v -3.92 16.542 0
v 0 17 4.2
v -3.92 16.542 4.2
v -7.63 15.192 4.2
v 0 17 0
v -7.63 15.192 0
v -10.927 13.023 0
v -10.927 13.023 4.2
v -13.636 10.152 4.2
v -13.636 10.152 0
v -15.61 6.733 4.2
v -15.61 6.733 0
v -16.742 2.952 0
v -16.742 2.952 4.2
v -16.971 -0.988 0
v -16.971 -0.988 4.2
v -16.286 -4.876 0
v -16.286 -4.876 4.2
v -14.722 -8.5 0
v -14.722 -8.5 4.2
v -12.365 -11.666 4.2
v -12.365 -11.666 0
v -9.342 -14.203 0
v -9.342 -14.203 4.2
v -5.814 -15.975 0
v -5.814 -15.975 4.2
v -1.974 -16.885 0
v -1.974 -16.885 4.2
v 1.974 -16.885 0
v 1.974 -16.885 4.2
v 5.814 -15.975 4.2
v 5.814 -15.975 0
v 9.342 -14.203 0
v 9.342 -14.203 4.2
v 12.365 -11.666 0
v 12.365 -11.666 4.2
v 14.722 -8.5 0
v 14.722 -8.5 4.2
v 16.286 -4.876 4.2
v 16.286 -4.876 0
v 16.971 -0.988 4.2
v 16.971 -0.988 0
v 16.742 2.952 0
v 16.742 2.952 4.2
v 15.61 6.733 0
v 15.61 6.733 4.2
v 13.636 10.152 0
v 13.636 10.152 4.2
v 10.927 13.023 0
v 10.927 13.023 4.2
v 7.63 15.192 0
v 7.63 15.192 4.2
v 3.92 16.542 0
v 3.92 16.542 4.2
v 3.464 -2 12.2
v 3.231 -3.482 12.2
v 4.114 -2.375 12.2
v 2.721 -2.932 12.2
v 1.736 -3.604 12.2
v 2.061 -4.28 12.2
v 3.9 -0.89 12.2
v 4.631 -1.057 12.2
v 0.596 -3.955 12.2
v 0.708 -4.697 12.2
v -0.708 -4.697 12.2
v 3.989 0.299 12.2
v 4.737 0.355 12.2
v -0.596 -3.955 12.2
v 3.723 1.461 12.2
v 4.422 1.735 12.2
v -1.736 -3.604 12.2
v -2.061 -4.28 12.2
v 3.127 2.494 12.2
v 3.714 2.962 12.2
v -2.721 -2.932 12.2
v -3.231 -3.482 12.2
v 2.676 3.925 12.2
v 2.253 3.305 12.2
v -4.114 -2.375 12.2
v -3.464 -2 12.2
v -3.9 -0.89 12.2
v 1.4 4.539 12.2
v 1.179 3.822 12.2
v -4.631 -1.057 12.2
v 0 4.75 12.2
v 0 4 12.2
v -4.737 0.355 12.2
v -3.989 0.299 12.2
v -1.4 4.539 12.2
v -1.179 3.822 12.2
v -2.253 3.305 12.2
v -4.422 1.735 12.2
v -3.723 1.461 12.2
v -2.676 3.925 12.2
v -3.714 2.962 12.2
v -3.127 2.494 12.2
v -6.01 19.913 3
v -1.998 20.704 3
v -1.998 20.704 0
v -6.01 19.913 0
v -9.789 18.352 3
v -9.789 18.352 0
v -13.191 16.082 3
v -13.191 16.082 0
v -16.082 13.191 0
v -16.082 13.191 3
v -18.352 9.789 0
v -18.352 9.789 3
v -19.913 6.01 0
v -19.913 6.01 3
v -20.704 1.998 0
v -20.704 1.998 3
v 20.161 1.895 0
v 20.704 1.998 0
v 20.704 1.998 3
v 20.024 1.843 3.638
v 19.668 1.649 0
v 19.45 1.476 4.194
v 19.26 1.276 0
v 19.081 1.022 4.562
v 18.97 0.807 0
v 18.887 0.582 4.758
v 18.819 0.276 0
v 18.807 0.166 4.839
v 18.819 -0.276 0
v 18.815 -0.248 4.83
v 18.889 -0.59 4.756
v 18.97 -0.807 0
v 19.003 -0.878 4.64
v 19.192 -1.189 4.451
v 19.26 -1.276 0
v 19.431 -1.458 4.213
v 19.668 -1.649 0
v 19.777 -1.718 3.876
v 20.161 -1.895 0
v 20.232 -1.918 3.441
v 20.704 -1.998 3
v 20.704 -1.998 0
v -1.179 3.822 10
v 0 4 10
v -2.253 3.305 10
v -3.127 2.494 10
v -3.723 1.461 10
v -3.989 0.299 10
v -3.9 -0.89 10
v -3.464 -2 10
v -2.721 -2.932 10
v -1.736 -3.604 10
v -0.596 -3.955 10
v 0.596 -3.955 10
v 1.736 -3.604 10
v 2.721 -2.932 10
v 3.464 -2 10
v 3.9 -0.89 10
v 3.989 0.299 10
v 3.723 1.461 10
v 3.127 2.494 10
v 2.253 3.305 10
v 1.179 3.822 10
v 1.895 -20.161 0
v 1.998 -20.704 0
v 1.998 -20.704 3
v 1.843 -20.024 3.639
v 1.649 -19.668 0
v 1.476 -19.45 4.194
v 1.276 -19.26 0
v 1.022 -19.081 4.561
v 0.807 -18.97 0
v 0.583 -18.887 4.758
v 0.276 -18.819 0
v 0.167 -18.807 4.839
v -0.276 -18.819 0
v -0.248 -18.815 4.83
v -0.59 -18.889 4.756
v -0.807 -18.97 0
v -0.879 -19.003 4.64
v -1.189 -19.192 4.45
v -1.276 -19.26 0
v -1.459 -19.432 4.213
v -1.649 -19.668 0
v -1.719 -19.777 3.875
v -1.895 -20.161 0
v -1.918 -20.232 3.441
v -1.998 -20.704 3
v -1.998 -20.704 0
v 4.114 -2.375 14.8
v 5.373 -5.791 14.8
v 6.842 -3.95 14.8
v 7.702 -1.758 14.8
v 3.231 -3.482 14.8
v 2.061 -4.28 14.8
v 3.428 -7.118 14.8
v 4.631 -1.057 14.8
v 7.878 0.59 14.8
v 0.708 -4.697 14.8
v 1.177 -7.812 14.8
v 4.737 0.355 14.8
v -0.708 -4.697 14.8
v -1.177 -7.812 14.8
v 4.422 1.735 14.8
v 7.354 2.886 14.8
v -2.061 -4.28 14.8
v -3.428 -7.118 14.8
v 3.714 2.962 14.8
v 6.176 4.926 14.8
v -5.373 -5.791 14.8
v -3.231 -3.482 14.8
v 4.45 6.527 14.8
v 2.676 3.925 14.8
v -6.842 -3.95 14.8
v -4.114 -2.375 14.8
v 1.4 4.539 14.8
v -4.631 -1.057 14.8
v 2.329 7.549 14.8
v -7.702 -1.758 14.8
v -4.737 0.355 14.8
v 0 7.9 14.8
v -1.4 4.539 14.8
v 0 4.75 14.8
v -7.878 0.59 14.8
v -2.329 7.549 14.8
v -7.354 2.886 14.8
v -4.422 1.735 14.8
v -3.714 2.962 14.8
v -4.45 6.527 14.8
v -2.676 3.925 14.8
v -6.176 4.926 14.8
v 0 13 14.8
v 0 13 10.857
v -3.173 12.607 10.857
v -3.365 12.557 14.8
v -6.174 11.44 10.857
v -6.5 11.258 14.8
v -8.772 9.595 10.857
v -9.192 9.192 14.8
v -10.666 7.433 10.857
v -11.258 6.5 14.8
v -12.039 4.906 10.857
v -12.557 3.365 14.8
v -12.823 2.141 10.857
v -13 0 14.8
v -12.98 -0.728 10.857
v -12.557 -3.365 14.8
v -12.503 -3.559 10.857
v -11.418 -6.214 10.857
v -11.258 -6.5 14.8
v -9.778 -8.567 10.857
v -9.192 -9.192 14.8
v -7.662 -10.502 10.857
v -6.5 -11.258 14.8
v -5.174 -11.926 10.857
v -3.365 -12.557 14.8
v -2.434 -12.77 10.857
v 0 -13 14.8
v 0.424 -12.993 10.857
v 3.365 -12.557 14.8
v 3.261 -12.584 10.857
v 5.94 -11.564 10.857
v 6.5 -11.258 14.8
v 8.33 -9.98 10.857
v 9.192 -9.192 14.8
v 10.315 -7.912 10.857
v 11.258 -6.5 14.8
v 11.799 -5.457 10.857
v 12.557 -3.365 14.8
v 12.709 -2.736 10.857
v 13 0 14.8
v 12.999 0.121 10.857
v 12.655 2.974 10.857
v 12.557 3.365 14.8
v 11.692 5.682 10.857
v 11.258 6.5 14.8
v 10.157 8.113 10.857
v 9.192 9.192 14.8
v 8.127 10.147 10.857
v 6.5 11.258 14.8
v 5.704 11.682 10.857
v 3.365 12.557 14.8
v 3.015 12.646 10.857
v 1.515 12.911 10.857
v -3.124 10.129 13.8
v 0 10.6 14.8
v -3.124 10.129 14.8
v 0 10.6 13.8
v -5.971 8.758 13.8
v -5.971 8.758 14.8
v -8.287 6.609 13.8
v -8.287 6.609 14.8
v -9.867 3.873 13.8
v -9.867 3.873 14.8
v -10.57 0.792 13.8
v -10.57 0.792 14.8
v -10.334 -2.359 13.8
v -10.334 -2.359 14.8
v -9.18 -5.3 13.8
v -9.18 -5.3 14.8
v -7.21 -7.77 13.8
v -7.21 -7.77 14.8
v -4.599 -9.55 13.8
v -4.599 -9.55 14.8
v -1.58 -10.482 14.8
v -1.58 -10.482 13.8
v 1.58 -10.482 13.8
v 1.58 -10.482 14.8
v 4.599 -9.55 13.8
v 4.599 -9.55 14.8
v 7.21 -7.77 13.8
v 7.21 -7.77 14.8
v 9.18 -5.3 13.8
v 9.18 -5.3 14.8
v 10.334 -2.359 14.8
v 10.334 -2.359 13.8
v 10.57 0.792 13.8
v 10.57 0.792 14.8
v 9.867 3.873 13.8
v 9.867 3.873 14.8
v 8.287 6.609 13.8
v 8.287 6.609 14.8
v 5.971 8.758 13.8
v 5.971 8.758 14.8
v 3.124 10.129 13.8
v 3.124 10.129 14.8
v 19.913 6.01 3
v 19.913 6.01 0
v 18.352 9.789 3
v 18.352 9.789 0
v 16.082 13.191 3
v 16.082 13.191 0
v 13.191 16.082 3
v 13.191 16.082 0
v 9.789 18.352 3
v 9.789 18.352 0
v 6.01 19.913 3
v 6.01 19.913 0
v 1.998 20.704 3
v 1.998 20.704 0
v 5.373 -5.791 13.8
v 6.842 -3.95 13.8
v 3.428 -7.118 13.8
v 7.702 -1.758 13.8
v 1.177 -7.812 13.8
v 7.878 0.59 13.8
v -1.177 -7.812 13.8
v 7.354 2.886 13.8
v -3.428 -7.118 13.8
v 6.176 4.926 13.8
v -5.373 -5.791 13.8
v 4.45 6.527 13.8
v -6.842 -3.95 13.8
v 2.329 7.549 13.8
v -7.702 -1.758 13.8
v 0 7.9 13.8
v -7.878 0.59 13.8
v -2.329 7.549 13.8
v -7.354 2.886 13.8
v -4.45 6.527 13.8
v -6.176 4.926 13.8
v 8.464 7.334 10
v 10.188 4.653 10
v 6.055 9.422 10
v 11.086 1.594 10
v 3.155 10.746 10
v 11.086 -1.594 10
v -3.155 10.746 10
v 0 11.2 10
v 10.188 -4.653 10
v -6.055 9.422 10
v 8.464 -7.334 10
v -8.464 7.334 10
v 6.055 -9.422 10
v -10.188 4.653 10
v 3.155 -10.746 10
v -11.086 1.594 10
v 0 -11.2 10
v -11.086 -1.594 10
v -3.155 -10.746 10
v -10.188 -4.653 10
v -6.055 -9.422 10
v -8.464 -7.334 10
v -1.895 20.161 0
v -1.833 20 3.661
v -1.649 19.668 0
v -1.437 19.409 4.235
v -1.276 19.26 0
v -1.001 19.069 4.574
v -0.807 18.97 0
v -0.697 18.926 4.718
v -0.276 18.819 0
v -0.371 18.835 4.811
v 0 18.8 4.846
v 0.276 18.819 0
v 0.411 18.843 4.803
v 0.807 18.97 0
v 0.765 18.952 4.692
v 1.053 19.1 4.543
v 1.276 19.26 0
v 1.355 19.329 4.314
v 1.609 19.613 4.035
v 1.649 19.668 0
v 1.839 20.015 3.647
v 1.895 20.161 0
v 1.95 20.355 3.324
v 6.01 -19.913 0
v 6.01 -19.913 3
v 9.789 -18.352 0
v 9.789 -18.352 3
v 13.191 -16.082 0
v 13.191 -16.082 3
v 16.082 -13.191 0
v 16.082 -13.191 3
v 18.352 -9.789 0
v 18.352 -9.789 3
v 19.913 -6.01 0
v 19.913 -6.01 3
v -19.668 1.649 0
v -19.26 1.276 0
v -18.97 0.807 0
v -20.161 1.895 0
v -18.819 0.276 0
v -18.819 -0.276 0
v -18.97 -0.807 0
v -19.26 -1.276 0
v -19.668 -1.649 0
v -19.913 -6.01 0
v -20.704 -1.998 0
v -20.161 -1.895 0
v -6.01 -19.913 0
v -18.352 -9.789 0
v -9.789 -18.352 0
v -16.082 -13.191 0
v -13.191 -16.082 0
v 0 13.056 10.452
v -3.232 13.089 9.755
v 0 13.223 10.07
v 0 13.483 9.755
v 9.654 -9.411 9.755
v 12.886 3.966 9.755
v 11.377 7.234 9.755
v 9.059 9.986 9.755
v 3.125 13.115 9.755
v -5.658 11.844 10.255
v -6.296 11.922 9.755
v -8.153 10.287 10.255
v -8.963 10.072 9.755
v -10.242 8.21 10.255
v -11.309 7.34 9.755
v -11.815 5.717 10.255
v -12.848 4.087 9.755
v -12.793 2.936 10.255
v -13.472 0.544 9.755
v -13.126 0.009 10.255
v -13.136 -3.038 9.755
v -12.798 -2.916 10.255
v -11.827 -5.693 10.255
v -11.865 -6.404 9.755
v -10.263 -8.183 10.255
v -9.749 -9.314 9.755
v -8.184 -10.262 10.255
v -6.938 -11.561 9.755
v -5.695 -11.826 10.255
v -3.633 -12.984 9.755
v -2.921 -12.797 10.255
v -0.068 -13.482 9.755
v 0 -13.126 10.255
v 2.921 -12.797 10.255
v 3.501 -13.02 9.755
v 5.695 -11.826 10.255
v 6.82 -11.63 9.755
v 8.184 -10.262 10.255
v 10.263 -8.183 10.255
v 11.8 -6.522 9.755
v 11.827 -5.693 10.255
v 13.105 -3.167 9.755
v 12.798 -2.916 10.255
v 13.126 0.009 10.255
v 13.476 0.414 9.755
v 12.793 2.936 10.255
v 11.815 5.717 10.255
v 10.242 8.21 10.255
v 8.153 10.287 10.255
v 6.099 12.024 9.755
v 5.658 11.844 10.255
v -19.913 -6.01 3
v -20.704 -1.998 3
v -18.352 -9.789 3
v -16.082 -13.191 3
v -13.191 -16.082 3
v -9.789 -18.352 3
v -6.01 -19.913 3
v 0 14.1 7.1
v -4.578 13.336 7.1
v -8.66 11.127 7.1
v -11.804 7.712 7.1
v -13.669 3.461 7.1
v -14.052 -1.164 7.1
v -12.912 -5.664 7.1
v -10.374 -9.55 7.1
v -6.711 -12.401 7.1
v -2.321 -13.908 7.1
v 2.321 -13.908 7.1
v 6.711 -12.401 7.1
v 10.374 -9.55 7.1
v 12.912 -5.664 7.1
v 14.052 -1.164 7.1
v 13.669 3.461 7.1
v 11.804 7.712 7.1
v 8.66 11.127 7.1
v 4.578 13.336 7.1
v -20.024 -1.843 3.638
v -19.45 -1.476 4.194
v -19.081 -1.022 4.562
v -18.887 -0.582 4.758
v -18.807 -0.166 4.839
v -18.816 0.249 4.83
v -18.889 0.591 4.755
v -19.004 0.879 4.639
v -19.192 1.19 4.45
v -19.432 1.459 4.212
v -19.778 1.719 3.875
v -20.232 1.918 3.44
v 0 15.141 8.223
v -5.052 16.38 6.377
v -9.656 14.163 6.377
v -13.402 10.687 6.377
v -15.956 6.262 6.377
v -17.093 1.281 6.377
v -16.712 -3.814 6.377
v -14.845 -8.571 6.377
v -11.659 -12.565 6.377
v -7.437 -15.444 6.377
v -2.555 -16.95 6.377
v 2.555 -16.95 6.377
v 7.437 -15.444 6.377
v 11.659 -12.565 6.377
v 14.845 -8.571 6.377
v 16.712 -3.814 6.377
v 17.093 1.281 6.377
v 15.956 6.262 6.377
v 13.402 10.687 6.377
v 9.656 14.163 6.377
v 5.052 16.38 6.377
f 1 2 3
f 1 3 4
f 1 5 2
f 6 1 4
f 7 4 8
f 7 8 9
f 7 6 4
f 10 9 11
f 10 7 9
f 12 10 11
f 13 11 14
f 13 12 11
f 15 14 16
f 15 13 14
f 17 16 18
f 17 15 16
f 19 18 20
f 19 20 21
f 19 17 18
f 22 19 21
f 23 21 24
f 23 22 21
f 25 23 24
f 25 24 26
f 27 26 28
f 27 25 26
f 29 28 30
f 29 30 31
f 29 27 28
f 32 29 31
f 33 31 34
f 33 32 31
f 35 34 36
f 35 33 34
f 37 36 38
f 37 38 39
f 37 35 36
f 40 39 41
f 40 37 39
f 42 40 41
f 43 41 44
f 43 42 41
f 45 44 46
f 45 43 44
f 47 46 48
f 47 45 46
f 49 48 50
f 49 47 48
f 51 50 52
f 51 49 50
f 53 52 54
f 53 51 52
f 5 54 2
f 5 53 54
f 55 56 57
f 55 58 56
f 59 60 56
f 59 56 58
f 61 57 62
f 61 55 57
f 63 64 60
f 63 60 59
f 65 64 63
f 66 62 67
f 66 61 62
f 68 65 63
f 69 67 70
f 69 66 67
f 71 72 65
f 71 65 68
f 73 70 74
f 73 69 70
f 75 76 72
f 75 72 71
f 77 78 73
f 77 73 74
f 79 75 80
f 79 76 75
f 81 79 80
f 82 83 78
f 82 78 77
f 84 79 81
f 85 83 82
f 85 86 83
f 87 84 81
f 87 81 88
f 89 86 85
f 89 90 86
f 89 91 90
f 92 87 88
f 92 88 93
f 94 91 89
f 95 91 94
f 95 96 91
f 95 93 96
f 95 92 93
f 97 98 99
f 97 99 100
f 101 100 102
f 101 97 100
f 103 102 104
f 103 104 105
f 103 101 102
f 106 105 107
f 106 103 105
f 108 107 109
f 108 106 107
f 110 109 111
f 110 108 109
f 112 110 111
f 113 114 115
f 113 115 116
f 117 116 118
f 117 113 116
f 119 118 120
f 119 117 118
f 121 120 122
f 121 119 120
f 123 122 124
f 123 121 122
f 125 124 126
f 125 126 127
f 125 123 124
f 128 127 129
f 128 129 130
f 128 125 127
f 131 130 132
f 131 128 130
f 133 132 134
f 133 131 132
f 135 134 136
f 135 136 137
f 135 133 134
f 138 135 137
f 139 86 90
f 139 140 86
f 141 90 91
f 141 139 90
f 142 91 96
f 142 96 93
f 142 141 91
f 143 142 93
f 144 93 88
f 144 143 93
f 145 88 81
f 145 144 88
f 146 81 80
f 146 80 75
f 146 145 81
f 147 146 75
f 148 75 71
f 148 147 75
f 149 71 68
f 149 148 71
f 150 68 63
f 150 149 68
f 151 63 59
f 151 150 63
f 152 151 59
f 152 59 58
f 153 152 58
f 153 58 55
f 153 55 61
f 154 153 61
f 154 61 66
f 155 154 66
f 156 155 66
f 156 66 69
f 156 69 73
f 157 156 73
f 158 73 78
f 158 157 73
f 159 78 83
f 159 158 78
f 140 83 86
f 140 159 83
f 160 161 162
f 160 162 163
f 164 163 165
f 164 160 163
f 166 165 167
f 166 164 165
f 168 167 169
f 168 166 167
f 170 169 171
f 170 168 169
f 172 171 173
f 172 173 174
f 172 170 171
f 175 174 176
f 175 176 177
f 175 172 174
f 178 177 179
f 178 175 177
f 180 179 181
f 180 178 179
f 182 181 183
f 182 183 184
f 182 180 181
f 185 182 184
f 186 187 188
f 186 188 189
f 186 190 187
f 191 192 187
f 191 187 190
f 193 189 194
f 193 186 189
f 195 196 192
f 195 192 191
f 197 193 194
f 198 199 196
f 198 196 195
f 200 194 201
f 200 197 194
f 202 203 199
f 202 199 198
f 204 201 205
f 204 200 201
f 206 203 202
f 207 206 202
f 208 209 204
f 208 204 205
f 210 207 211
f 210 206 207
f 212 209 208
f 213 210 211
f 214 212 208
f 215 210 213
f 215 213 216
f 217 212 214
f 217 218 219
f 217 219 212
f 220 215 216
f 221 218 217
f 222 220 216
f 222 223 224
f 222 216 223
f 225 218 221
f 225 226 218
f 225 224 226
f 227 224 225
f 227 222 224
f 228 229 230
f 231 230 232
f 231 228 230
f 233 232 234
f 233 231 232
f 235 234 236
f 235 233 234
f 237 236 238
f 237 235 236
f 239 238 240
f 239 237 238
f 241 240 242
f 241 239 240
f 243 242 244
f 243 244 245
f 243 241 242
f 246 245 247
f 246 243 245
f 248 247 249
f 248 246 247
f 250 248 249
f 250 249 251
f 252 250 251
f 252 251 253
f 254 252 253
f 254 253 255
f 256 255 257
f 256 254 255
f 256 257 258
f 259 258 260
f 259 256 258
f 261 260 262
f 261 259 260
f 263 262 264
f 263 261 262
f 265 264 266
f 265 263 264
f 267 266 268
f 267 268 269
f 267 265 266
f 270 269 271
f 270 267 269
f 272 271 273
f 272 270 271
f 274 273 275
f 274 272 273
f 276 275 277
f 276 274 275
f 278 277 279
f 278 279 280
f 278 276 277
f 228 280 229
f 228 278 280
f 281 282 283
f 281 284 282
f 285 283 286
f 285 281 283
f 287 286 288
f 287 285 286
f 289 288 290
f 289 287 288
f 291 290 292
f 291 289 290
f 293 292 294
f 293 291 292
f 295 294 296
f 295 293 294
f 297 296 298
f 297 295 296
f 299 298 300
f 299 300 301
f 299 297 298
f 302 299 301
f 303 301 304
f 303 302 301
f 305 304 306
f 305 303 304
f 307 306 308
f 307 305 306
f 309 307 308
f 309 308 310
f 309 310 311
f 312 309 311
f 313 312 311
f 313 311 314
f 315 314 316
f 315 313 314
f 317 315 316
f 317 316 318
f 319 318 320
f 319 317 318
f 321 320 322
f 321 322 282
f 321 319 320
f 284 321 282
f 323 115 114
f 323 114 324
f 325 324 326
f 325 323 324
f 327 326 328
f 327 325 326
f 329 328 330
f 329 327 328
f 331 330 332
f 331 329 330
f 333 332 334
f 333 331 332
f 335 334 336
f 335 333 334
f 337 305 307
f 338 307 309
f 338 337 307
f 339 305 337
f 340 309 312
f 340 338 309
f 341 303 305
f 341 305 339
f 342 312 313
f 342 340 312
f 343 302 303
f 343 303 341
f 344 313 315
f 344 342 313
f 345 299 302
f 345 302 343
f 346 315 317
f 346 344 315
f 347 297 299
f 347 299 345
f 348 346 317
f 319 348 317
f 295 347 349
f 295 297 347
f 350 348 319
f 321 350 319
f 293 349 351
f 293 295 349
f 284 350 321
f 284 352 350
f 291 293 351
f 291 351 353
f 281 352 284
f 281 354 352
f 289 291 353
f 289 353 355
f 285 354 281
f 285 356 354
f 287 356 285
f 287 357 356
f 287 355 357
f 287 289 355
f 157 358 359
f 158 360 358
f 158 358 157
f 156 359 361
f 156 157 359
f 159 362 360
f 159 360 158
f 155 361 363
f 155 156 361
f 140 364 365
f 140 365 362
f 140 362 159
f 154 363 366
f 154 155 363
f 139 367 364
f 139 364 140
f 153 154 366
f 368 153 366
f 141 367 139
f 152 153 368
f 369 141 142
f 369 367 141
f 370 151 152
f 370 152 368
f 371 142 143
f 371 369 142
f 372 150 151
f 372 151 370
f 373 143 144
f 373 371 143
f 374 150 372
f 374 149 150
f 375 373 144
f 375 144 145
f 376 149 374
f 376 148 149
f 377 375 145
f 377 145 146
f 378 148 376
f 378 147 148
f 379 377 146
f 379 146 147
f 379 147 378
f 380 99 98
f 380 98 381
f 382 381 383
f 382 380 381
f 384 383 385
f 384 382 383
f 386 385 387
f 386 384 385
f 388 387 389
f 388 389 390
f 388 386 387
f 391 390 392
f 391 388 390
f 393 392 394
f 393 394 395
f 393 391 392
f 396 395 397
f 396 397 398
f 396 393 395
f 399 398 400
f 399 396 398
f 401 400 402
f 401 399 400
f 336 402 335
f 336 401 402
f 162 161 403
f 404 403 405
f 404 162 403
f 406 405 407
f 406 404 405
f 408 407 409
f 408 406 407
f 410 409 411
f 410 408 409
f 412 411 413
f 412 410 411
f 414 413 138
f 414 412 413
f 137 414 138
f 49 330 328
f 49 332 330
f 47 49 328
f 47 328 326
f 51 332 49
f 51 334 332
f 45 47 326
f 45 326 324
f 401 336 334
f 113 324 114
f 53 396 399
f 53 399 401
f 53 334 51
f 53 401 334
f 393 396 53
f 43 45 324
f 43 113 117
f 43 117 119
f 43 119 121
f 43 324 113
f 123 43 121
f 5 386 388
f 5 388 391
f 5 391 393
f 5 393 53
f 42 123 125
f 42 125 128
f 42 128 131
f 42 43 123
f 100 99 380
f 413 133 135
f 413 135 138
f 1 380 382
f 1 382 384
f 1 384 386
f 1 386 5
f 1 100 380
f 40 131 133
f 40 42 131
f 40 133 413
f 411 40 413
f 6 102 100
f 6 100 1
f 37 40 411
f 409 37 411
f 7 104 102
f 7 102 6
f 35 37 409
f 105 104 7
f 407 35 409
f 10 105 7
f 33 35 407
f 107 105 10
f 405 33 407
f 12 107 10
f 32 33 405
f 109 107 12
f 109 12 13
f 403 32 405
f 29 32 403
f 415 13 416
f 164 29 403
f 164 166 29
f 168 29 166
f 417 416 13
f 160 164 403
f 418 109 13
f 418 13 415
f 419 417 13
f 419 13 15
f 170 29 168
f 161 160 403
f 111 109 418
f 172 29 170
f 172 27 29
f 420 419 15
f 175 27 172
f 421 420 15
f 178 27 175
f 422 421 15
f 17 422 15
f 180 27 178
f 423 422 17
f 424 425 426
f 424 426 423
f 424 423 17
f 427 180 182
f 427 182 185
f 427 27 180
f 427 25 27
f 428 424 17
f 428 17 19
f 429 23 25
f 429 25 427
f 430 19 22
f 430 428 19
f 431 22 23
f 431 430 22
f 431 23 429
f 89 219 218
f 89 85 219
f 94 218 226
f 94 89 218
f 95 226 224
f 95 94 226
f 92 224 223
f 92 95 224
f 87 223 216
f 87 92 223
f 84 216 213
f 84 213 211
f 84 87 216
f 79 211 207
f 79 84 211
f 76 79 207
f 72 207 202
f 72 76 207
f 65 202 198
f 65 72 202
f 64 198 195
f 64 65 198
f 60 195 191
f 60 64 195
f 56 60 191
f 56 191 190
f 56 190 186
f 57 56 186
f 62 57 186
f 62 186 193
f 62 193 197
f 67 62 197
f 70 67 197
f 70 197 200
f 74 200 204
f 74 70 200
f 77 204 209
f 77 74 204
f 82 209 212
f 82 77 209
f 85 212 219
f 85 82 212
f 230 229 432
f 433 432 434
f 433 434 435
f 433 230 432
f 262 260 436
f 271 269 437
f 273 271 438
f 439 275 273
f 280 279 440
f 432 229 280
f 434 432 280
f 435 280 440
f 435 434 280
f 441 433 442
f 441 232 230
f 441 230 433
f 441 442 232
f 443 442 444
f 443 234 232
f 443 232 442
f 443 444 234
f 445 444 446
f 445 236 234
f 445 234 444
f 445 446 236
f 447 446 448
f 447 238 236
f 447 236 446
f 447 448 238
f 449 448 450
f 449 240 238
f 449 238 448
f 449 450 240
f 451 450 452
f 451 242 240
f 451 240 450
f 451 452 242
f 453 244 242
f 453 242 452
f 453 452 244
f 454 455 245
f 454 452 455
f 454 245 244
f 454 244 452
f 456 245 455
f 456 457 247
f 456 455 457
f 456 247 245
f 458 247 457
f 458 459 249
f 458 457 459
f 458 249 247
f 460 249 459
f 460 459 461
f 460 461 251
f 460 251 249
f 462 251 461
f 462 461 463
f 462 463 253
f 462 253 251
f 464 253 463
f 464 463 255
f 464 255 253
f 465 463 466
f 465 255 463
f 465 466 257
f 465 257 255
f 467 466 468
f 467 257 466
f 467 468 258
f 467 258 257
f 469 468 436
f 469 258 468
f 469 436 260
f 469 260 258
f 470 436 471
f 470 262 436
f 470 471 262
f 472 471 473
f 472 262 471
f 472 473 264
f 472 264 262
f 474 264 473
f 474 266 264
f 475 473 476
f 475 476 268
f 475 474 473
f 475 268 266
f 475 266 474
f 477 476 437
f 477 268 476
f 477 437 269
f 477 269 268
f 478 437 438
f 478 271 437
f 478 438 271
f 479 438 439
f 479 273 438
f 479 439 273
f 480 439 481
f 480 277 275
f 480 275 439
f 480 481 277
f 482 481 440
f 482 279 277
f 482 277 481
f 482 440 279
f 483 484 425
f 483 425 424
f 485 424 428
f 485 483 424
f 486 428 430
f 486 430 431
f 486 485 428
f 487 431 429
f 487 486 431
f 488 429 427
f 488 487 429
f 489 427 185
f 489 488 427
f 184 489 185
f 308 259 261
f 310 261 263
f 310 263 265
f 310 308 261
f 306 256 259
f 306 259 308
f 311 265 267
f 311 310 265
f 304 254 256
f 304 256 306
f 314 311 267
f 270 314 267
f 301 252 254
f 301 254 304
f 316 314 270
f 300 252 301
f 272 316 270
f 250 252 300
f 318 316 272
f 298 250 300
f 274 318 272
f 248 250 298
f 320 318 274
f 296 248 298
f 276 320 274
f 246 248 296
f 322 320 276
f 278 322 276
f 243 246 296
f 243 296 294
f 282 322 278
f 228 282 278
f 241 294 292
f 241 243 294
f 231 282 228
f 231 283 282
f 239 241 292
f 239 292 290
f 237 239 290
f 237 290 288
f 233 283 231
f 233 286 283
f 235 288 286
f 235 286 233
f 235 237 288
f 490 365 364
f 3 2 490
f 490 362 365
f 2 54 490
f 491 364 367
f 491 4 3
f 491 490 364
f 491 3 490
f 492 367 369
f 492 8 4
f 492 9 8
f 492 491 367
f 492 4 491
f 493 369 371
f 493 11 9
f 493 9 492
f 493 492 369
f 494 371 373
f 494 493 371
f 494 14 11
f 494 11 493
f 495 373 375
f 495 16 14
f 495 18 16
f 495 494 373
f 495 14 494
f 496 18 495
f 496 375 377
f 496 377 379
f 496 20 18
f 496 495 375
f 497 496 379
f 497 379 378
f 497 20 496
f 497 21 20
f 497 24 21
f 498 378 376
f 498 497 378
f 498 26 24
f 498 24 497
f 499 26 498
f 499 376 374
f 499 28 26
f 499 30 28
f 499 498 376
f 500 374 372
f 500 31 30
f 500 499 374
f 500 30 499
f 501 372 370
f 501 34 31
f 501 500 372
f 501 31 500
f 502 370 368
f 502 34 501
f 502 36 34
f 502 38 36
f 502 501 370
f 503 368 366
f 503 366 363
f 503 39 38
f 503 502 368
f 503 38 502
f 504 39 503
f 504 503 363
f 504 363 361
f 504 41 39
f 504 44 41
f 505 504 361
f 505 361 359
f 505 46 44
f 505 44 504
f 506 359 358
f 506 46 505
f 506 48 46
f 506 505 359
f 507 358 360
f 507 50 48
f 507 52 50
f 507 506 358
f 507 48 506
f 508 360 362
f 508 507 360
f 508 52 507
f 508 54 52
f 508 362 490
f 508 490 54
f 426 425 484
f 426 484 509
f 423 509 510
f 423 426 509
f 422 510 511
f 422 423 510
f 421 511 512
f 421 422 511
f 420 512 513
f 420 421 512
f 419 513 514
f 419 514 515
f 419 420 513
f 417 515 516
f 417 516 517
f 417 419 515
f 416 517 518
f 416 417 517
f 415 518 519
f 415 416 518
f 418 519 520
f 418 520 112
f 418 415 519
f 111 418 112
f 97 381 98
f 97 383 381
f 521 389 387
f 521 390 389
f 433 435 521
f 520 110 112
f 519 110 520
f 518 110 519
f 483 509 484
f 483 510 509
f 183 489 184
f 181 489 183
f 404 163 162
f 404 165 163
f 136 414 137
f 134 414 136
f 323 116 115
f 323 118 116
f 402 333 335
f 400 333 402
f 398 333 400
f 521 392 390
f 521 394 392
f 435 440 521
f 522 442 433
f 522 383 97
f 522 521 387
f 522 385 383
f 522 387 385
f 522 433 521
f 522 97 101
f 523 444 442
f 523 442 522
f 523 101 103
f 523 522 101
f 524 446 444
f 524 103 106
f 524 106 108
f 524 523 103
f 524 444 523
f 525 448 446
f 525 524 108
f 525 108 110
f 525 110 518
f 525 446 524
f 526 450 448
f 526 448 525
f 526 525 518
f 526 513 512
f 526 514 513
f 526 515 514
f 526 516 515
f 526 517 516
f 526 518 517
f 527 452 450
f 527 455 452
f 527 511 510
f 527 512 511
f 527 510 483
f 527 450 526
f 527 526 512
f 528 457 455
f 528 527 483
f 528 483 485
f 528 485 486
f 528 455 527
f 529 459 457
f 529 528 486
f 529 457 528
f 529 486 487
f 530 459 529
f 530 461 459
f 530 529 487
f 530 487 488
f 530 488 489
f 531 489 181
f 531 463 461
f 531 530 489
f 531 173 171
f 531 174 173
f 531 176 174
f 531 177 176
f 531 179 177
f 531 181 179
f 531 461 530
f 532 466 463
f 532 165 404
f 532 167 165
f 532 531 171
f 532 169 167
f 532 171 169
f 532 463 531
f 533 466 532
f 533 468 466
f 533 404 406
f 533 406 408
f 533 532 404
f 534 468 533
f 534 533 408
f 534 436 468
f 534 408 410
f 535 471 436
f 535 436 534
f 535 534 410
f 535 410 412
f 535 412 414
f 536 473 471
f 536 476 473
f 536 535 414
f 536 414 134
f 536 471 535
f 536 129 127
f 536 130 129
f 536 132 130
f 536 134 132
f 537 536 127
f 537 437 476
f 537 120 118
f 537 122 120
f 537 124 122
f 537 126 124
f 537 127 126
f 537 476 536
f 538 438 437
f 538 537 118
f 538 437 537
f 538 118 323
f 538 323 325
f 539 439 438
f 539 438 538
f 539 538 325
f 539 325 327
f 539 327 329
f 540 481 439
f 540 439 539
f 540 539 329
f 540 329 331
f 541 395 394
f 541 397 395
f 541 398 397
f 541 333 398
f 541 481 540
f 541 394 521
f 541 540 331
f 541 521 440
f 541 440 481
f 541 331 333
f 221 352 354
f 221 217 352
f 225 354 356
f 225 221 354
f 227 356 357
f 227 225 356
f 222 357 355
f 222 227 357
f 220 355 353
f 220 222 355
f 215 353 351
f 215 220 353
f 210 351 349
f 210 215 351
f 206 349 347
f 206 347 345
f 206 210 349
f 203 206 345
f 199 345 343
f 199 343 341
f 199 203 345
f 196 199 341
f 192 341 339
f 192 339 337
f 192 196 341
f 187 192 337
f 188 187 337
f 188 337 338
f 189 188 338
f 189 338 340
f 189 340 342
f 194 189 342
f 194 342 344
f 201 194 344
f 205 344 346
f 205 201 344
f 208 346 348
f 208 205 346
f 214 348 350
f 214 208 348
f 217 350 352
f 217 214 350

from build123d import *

# Parameters (mm, degrees)
CUT_EXTRUDE1_REACH = 34.929
SKETCH3_R          = 2
FILLET1_R          = 1.5


with BuildPart() as part:
    # Sketch2 → Revolve1 (revolve)
    with BuildSketch(Plane(origin=(0, 0, 0), x_dir=(0, 0, -1), z_dir=(1, 0, 0))):
        Polygon((0, 17), (0, 20.8), (-3, 20.8), (-10.2, 13), (-14.8, 13), (-14.8, 10.6), (-13.8, 10.6), (-13.8, 7.9), (-14.8, 7.9), (-14.8, 4.75), (-12.2, 4.75), (-12.2, 4), (-10, 4), (-10, 11.2), (-4.2, 17), align=None)
    revolve(axis=Axis((0, 0, 0), (0, 0, 1)))

    # Cut-Extrude1: up to this cone (the profile starts inside it)
    cut_extrude1_end = Plane(origin=(0, 0, 0), z_dir=(0, 0, -1)).offset(-22.199999) * Cone(1.083e-06, 88.485583333, 81.678999, align=(Align.CENTER, Align.CENTER, Align.MIN), mode=Mode.PRIVATE)
    # Sketch3 → Cut-Extrude1 (cut, up to the surface)
    with BuildSketch(Plane.XY, mode=Mode.PRIVATE) as cut_extrude1_sk1:
        with Locations((0, 20.8)):
            Circle(SKETCH3_R)
    cut_extrude1_tool1 = extrude(cut_extrude1_sk1.sketch, amount=CUT_EXTRUDE1_REACH, mode=Mode.PRIVATE) & cut_extrude1_end
    add(cut_extrude1_tool1.solids().sort_by_distance((0, 20.8, 0))[0], mode=Mode.SUBTRACT)
    # Sketch3 → Cut-Extrude1 (cut, up to the surface)
    with BuildSketch(Plane.XY, mode=Mode.PRIVATE) as cut_extrude1_sk2:
        with Locations((20.8, 0)):
            Circle(SKETCH3_R)
    cut_extrude1_tool2 = extrude(cut_extrude1_sk2.sketch, amount=CUT_EXTRUDE1_REACH, mode=Mode.PRIVATE) & cut_extrude1_end
    add(cut_extrude1_tool2.solids().sort_by_distance((20.8, 0, 0))[0], mode=Mode.SUBTRACT)
    # Sketch3 → Cut-Extrude1 (cut, up to the surface)
    with BuildSketch(Plane.XY, mode=Mode.PRIVATE) as cut_extrude1_sk3:
        with Locations((0, -20.8)):
            Circle(SKETCH3_R)
    cut_extrude1_tool3 = extrude(cut_extrude1_sk3.sketch, amount=CUT_EXTRUDE1_REACH, mode=Mode.PRIVATE) & cut_extrude1_end
    add(cut_extrude1_tool3.solids().sort_by_distance((0, -20.8, 0))[0], mode=Mode.SUBTRACT)
    # Sketch3 → Cut-Extrude1 (cut, up to the surface)
    with BuildSketch(Plane.XY, mode=Mode.PRIVATE) as cut_extrude1_sk4:
        with Locations((-20.8, 0)):
            Circle(SKETCH3_R)
    cut_extrude1_tool4 = extrude(cut_extrude1_sk4.sketch, amount=CUT_EXTRUDE1_REACH, mode=Mode.PRIVATE) & cut_extrude1_end
    add(cut_extrude1_tool4.solids().sort_by_distance((-20.8, 0, 0))[0], mode=Mode.SUBTRACT)

    # Fillet1
    fillet1_edges = [part.edges().sort_by_distance(p)[0] for p in [
        (0, -13, 10.2),
    ]]
    fillet(fillet1_edges, radius=FILLET1_R)


solid = part.part
